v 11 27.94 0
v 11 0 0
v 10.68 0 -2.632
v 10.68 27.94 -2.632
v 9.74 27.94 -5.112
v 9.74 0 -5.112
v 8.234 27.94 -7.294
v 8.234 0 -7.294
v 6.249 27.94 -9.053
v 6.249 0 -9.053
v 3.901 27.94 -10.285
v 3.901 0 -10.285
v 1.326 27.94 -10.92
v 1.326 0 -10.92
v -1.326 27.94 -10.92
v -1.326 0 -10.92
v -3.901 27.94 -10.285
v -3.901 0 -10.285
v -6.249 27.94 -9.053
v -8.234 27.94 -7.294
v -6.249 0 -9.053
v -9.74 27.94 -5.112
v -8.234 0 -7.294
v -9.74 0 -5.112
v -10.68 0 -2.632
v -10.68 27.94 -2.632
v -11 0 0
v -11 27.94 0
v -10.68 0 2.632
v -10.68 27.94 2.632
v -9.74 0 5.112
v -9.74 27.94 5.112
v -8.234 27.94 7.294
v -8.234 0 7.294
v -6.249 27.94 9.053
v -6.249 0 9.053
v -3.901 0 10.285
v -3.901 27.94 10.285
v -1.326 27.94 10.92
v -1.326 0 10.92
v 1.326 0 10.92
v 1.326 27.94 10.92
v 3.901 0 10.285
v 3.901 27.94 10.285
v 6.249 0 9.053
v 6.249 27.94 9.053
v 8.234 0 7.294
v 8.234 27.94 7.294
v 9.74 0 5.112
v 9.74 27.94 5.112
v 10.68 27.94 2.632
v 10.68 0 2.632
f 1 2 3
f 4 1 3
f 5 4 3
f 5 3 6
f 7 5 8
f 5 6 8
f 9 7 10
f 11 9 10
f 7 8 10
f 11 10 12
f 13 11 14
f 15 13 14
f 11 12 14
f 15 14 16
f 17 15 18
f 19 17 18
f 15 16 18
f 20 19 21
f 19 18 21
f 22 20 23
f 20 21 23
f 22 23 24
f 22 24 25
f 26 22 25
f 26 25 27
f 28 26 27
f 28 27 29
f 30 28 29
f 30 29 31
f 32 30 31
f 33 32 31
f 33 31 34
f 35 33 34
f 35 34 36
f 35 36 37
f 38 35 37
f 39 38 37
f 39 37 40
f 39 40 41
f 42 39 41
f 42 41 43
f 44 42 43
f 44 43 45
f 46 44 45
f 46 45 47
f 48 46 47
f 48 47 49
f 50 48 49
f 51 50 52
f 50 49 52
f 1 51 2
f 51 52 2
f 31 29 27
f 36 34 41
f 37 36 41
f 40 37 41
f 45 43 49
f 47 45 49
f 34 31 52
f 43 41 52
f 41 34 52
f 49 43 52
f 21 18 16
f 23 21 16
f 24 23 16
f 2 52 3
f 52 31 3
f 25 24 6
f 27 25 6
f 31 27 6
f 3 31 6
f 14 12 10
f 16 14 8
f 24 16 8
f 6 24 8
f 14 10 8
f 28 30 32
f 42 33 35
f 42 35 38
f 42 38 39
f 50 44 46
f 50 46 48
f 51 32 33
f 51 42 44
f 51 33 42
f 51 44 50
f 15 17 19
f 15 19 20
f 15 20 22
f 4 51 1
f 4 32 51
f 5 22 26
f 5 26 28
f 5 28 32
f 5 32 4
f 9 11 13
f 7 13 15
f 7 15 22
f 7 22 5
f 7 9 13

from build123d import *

# Parameters (mm, degrees)
SKETCH1_R           = 11
BOSS_EXTRUDE1_DEPTH = 27.94
SKETCH2_R           = 10.4267
CUT_EXTRUDE1_DEPTH  = 1.1684
SKETCH3_R           = 11
BOSS_EXTRUDE2_DEPTH = 20.32


with BuildPart() as part:
    # Sketch1 → Boss-Extrude1 (new body)
    with BuildSketch(Plane(origin=(0, 0, 0), x_dir=(1, 0, 0), z_dir=(0, 1, 0))):
        Circle(SKETCH1_R)
    extrude(amount=BOSS_EXTRUDE1_DEPTH)

    # Sketch2 → Cut-Extrude1 (cut)
    with BuildSketch(Plane(origin=(0, 12.954, 0), x_dir=(1, 0, 0), z_dir=(0, 1, 0))):
        with BuildLine():
            Line((-17.239436612, 14.563425366), (-16.28375247, -14.840830381))
            Line((-16.28375247, -14.840830381), (21.406068048, -16.295664576))
            Line((21.406068048, -16.295664576), (22.094276354, 14.197317514))
            Line((22.094276354, 14.197317514), (19.887741586, 14.563425366))
            ThreePointArc((19.887741586, 14.563425366), (1.324152487, 14.86501853), (-17.239436612, 14.563425366))
        make_face()
        Circle(SKETCH2_R, mode=Mode.SUBTRACT)
    extrude(amount=-CUT_EXTRUDE1_DEPTH, mode=Mode.SUBTRACT)

    # Sketch3 → Boss-Extrude2 (add)
    with BuildSketch(Plane.XZ):
        Circle(SKETCH3_R)
    extrude(amount=-BOSS_EXTRUDE2_DEPTH)


solid = part.part
